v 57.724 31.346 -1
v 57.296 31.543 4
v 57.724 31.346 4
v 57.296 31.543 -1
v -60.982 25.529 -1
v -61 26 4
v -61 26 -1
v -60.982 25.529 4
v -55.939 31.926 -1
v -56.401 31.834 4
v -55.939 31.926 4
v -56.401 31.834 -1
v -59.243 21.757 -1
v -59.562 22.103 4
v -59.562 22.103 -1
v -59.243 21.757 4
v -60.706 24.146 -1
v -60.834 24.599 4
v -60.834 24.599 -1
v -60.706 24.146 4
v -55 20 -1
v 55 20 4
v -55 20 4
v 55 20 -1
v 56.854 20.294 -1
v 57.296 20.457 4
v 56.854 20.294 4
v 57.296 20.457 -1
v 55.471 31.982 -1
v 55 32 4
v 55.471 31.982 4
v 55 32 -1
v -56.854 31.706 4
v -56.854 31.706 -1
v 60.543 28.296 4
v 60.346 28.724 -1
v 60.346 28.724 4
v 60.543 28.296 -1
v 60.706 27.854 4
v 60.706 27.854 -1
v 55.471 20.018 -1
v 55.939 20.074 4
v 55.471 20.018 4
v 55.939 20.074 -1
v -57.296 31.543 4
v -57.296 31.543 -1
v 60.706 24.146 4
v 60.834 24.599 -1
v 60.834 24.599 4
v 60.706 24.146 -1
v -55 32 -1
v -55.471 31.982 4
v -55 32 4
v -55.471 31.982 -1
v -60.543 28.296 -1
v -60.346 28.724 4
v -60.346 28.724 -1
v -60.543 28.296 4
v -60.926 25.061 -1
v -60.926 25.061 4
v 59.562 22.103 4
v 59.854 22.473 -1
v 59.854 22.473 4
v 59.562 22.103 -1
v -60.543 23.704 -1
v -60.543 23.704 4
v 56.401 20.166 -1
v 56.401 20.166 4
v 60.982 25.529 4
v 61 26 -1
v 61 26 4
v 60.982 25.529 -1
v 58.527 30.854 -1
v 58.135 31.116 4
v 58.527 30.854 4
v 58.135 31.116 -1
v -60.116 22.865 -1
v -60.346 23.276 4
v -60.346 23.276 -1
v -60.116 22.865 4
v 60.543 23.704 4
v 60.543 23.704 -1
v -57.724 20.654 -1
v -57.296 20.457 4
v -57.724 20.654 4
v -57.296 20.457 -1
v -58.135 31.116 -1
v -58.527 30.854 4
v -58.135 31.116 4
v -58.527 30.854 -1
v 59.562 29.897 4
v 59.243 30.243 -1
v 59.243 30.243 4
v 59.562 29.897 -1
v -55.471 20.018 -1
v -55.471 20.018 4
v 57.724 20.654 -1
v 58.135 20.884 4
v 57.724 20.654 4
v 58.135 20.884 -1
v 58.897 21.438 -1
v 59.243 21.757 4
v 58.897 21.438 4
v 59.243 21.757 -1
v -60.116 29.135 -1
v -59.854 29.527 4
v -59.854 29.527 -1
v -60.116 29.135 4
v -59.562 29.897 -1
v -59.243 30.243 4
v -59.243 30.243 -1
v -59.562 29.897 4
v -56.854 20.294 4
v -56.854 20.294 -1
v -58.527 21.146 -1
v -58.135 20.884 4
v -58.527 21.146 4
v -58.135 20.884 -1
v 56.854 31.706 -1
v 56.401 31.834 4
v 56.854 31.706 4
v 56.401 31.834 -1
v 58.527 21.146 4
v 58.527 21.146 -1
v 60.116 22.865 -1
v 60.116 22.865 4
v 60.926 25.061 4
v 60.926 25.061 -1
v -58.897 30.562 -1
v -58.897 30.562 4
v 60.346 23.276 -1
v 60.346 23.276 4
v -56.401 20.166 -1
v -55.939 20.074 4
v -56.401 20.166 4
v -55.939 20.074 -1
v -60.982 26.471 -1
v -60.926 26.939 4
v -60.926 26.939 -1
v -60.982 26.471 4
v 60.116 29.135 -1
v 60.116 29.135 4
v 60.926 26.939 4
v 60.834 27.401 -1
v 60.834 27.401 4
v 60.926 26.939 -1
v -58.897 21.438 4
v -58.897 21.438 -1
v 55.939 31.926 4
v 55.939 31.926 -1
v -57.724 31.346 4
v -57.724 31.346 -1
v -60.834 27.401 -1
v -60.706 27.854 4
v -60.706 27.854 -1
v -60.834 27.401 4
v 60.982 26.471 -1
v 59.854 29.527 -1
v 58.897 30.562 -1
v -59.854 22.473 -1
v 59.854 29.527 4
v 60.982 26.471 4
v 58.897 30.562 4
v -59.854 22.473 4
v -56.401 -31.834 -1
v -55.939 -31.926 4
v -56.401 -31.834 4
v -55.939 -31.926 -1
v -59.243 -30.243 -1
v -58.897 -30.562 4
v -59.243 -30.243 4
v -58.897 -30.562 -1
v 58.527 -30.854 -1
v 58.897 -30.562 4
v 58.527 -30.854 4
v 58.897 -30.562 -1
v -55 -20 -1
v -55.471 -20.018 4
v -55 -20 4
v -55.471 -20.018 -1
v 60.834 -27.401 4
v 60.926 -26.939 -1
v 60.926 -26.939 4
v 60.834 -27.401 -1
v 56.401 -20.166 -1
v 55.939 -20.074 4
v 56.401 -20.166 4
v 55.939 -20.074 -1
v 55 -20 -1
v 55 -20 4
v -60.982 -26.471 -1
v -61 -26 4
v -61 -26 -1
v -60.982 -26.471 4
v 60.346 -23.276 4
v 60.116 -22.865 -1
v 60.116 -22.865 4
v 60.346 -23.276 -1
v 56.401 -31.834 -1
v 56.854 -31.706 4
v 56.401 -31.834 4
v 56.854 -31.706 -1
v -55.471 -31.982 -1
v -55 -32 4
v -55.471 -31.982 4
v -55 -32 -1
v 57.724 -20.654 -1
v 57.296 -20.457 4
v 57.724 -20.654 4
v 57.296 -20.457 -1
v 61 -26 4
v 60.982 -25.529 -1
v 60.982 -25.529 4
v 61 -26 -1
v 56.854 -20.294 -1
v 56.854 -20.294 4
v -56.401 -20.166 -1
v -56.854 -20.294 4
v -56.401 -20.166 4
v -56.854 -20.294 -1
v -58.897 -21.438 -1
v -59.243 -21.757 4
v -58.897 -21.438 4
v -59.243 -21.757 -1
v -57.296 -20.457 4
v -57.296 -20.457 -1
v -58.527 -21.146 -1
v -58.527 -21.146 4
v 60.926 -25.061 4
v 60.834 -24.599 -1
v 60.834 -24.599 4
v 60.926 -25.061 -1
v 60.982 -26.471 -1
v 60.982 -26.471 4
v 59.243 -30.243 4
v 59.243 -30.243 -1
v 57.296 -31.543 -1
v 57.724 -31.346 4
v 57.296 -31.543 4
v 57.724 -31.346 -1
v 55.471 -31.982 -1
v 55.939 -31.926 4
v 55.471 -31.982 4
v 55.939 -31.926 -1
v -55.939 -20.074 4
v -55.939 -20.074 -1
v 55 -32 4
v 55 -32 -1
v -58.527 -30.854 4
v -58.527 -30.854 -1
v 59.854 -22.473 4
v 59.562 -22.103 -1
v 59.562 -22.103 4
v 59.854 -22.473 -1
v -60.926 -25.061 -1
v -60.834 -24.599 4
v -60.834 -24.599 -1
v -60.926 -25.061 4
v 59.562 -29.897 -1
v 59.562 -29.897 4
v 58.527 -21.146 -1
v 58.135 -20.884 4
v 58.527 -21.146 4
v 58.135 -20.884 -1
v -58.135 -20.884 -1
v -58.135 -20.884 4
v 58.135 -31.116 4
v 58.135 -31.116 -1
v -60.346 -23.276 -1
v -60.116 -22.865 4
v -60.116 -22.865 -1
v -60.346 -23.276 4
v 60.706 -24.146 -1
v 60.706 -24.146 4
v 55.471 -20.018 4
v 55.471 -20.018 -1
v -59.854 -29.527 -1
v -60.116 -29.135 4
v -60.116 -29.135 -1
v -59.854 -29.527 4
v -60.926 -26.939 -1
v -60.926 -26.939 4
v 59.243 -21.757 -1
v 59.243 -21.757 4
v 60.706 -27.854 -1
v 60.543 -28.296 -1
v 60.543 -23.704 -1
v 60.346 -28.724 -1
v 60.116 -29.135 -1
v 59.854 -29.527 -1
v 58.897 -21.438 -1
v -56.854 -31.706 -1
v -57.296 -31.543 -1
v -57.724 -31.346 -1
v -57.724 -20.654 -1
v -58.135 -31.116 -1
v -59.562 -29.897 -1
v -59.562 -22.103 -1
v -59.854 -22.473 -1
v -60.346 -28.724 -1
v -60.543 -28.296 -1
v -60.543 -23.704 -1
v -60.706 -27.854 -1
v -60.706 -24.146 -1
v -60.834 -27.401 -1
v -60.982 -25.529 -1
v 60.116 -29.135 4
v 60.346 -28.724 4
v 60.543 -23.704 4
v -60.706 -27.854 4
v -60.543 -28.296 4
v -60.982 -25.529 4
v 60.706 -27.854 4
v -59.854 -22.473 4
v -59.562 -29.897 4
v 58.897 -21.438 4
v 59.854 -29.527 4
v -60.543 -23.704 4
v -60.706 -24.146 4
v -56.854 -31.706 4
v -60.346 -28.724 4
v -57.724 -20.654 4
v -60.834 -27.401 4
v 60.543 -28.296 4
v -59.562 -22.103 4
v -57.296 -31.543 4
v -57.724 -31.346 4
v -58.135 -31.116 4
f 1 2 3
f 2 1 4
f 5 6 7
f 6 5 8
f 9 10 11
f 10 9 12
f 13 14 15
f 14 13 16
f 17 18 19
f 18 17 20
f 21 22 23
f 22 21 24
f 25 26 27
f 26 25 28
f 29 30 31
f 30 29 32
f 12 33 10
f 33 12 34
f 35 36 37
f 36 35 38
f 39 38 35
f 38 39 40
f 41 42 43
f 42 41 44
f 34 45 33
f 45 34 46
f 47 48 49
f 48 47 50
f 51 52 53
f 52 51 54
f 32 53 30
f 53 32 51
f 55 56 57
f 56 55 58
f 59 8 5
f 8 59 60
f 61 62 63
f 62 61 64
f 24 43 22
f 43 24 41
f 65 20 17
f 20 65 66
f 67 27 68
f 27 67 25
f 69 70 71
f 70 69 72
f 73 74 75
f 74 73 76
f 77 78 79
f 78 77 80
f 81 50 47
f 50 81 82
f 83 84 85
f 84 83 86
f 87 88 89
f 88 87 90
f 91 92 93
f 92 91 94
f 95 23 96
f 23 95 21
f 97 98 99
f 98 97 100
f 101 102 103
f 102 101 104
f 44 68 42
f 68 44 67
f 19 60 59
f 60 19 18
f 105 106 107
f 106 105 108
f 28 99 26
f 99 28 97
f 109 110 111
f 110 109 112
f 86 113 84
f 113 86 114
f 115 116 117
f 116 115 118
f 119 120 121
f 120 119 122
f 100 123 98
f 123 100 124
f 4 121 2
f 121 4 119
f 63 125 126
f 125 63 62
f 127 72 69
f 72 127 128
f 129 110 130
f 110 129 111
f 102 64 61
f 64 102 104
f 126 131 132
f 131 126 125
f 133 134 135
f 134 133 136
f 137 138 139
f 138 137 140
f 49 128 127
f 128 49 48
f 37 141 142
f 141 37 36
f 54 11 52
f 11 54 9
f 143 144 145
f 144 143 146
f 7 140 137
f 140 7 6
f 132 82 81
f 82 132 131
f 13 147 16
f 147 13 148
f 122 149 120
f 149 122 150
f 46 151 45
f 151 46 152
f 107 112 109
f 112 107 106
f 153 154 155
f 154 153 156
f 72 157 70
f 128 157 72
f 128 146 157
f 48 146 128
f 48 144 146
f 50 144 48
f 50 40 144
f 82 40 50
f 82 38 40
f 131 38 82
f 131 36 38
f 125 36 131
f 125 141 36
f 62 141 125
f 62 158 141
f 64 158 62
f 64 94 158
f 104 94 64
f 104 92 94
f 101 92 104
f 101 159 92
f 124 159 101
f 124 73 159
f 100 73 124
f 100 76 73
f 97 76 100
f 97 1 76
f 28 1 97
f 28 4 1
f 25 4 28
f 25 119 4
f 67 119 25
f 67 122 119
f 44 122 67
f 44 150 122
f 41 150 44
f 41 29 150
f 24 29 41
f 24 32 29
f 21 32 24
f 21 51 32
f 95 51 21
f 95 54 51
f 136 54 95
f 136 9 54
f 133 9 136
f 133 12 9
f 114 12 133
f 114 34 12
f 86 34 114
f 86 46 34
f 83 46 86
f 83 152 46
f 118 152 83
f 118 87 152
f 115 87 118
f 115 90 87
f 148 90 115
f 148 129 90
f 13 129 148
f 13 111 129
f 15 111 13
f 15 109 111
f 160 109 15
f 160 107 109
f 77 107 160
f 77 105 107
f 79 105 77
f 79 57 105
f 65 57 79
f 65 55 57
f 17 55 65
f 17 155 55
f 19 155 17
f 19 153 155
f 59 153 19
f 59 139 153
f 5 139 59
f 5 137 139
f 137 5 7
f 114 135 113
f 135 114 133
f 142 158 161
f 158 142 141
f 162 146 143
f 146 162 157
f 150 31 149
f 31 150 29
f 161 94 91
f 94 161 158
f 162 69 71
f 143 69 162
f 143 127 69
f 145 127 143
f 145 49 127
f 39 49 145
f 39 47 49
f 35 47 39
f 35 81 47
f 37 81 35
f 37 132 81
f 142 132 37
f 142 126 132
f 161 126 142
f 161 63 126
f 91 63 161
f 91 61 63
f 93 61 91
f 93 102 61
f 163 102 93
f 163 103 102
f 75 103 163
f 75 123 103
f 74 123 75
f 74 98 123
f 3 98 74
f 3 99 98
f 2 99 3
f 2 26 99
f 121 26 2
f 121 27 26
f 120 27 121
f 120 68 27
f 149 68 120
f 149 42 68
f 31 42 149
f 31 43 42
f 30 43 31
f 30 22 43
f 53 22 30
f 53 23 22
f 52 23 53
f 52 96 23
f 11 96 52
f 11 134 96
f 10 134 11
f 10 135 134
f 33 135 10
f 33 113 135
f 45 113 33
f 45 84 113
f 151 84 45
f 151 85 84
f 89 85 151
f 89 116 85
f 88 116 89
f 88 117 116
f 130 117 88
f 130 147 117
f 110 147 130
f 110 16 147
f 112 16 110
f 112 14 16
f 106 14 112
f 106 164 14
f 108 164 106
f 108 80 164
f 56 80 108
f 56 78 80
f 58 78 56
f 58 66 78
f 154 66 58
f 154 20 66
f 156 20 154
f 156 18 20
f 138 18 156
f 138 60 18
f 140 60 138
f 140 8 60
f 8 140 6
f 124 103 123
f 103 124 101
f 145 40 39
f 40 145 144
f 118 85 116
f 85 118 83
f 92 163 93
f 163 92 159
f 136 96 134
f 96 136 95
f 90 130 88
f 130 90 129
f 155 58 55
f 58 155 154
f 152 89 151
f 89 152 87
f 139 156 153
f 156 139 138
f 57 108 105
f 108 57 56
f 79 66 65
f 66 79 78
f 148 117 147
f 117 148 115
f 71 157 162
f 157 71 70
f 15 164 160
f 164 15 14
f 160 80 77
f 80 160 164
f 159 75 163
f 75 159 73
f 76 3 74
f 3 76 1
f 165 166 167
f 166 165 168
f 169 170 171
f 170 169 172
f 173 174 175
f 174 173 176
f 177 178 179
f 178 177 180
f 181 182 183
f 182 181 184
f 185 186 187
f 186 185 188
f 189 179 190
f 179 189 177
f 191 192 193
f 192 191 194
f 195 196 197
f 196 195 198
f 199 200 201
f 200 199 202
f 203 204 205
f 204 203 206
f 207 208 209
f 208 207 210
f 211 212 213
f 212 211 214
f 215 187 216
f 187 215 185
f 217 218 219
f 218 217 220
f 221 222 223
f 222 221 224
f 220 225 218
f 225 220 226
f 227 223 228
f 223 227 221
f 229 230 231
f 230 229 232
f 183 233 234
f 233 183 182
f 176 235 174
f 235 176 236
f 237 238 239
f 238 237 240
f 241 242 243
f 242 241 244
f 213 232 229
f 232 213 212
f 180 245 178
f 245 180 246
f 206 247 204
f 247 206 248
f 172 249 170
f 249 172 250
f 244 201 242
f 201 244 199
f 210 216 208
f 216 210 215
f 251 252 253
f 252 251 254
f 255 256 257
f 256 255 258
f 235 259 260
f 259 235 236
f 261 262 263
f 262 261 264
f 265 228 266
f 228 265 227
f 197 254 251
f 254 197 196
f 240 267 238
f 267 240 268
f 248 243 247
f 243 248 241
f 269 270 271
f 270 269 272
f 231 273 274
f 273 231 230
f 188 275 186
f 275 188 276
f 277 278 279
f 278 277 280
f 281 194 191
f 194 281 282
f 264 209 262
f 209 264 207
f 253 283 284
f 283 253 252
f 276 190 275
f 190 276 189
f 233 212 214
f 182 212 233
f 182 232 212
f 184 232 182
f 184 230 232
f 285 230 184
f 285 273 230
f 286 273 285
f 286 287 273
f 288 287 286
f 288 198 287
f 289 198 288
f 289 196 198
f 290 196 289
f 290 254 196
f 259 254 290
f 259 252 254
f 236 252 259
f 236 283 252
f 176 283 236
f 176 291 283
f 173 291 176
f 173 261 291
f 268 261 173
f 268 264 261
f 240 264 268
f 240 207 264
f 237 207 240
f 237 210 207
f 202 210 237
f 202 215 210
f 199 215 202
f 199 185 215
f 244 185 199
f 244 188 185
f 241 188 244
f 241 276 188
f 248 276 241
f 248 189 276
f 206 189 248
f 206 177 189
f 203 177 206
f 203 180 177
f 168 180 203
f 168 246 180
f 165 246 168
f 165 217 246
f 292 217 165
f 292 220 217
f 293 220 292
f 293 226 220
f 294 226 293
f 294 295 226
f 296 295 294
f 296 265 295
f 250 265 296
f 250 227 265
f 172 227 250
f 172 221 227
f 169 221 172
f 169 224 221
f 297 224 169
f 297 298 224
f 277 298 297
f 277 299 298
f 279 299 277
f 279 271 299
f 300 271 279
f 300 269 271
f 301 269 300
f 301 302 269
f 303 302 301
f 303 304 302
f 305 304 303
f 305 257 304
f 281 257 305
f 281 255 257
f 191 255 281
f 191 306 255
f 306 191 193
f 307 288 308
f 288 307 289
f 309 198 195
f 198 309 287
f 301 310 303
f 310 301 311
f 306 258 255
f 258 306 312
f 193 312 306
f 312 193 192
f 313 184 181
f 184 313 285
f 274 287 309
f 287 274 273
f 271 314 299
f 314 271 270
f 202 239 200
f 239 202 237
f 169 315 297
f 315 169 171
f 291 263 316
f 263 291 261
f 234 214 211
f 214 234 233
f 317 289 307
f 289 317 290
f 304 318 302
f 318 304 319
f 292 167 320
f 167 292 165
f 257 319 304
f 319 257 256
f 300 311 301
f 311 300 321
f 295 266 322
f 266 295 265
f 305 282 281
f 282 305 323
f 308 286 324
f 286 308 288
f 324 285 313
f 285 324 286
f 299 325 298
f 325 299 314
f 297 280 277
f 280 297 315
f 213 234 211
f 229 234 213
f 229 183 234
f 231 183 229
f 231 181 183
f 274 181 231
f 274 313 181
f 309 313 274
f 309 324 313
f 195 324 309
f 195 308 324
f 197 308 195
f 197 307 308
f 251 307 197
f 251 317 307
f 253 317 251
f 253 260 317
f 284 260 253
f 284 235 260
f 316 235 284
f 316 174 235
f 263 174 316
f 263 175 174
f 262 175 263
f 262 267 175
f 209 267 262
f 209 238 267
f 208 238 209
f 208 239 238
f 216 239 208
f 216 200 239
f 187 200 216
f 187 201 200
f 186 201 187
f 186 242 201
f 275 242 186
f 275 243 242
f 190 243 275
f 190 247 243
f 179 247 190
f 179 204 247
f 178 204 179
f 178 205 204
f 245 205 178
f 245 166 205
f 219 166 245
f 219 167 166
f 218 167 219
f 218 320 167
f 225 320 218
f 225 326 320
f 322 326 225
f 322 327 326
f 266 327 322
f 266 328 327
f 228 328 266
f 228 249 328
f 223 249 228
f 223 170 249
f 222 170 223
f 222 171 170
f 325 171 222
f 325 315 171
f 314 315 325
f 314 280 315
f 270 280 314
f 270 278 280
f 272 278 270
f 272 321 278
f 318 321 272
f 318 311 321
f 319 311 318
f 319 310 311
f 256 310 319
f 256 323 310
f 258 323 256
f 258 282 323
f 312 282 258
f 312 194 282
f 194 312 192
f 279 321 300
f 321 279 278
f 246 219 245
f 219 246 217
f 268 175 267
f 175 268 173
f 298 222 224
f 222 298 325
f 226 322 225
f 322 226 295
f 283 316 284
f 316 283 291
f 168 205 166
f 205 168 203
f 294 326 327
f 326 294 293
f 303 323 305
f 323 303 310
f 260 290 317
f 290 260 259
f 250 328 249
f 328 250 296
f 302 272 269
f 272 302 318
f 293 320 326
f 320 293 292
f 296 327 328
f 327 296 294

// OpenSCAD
$fn=80;

if (1) {
   hull() {
      color("red") translate([-55,26,-1]) cylinder(d=12,h=5);
      color("red") translate([55,26,-1]) cylinder(d=12,h=5);
   }

   hull() {
      color("red") translate([-55,-26,-1]) cylinder(d=12,h=5);
      color("red") translate([55,-26,-1]) cylinder(d=12,h=5);
   }
}
